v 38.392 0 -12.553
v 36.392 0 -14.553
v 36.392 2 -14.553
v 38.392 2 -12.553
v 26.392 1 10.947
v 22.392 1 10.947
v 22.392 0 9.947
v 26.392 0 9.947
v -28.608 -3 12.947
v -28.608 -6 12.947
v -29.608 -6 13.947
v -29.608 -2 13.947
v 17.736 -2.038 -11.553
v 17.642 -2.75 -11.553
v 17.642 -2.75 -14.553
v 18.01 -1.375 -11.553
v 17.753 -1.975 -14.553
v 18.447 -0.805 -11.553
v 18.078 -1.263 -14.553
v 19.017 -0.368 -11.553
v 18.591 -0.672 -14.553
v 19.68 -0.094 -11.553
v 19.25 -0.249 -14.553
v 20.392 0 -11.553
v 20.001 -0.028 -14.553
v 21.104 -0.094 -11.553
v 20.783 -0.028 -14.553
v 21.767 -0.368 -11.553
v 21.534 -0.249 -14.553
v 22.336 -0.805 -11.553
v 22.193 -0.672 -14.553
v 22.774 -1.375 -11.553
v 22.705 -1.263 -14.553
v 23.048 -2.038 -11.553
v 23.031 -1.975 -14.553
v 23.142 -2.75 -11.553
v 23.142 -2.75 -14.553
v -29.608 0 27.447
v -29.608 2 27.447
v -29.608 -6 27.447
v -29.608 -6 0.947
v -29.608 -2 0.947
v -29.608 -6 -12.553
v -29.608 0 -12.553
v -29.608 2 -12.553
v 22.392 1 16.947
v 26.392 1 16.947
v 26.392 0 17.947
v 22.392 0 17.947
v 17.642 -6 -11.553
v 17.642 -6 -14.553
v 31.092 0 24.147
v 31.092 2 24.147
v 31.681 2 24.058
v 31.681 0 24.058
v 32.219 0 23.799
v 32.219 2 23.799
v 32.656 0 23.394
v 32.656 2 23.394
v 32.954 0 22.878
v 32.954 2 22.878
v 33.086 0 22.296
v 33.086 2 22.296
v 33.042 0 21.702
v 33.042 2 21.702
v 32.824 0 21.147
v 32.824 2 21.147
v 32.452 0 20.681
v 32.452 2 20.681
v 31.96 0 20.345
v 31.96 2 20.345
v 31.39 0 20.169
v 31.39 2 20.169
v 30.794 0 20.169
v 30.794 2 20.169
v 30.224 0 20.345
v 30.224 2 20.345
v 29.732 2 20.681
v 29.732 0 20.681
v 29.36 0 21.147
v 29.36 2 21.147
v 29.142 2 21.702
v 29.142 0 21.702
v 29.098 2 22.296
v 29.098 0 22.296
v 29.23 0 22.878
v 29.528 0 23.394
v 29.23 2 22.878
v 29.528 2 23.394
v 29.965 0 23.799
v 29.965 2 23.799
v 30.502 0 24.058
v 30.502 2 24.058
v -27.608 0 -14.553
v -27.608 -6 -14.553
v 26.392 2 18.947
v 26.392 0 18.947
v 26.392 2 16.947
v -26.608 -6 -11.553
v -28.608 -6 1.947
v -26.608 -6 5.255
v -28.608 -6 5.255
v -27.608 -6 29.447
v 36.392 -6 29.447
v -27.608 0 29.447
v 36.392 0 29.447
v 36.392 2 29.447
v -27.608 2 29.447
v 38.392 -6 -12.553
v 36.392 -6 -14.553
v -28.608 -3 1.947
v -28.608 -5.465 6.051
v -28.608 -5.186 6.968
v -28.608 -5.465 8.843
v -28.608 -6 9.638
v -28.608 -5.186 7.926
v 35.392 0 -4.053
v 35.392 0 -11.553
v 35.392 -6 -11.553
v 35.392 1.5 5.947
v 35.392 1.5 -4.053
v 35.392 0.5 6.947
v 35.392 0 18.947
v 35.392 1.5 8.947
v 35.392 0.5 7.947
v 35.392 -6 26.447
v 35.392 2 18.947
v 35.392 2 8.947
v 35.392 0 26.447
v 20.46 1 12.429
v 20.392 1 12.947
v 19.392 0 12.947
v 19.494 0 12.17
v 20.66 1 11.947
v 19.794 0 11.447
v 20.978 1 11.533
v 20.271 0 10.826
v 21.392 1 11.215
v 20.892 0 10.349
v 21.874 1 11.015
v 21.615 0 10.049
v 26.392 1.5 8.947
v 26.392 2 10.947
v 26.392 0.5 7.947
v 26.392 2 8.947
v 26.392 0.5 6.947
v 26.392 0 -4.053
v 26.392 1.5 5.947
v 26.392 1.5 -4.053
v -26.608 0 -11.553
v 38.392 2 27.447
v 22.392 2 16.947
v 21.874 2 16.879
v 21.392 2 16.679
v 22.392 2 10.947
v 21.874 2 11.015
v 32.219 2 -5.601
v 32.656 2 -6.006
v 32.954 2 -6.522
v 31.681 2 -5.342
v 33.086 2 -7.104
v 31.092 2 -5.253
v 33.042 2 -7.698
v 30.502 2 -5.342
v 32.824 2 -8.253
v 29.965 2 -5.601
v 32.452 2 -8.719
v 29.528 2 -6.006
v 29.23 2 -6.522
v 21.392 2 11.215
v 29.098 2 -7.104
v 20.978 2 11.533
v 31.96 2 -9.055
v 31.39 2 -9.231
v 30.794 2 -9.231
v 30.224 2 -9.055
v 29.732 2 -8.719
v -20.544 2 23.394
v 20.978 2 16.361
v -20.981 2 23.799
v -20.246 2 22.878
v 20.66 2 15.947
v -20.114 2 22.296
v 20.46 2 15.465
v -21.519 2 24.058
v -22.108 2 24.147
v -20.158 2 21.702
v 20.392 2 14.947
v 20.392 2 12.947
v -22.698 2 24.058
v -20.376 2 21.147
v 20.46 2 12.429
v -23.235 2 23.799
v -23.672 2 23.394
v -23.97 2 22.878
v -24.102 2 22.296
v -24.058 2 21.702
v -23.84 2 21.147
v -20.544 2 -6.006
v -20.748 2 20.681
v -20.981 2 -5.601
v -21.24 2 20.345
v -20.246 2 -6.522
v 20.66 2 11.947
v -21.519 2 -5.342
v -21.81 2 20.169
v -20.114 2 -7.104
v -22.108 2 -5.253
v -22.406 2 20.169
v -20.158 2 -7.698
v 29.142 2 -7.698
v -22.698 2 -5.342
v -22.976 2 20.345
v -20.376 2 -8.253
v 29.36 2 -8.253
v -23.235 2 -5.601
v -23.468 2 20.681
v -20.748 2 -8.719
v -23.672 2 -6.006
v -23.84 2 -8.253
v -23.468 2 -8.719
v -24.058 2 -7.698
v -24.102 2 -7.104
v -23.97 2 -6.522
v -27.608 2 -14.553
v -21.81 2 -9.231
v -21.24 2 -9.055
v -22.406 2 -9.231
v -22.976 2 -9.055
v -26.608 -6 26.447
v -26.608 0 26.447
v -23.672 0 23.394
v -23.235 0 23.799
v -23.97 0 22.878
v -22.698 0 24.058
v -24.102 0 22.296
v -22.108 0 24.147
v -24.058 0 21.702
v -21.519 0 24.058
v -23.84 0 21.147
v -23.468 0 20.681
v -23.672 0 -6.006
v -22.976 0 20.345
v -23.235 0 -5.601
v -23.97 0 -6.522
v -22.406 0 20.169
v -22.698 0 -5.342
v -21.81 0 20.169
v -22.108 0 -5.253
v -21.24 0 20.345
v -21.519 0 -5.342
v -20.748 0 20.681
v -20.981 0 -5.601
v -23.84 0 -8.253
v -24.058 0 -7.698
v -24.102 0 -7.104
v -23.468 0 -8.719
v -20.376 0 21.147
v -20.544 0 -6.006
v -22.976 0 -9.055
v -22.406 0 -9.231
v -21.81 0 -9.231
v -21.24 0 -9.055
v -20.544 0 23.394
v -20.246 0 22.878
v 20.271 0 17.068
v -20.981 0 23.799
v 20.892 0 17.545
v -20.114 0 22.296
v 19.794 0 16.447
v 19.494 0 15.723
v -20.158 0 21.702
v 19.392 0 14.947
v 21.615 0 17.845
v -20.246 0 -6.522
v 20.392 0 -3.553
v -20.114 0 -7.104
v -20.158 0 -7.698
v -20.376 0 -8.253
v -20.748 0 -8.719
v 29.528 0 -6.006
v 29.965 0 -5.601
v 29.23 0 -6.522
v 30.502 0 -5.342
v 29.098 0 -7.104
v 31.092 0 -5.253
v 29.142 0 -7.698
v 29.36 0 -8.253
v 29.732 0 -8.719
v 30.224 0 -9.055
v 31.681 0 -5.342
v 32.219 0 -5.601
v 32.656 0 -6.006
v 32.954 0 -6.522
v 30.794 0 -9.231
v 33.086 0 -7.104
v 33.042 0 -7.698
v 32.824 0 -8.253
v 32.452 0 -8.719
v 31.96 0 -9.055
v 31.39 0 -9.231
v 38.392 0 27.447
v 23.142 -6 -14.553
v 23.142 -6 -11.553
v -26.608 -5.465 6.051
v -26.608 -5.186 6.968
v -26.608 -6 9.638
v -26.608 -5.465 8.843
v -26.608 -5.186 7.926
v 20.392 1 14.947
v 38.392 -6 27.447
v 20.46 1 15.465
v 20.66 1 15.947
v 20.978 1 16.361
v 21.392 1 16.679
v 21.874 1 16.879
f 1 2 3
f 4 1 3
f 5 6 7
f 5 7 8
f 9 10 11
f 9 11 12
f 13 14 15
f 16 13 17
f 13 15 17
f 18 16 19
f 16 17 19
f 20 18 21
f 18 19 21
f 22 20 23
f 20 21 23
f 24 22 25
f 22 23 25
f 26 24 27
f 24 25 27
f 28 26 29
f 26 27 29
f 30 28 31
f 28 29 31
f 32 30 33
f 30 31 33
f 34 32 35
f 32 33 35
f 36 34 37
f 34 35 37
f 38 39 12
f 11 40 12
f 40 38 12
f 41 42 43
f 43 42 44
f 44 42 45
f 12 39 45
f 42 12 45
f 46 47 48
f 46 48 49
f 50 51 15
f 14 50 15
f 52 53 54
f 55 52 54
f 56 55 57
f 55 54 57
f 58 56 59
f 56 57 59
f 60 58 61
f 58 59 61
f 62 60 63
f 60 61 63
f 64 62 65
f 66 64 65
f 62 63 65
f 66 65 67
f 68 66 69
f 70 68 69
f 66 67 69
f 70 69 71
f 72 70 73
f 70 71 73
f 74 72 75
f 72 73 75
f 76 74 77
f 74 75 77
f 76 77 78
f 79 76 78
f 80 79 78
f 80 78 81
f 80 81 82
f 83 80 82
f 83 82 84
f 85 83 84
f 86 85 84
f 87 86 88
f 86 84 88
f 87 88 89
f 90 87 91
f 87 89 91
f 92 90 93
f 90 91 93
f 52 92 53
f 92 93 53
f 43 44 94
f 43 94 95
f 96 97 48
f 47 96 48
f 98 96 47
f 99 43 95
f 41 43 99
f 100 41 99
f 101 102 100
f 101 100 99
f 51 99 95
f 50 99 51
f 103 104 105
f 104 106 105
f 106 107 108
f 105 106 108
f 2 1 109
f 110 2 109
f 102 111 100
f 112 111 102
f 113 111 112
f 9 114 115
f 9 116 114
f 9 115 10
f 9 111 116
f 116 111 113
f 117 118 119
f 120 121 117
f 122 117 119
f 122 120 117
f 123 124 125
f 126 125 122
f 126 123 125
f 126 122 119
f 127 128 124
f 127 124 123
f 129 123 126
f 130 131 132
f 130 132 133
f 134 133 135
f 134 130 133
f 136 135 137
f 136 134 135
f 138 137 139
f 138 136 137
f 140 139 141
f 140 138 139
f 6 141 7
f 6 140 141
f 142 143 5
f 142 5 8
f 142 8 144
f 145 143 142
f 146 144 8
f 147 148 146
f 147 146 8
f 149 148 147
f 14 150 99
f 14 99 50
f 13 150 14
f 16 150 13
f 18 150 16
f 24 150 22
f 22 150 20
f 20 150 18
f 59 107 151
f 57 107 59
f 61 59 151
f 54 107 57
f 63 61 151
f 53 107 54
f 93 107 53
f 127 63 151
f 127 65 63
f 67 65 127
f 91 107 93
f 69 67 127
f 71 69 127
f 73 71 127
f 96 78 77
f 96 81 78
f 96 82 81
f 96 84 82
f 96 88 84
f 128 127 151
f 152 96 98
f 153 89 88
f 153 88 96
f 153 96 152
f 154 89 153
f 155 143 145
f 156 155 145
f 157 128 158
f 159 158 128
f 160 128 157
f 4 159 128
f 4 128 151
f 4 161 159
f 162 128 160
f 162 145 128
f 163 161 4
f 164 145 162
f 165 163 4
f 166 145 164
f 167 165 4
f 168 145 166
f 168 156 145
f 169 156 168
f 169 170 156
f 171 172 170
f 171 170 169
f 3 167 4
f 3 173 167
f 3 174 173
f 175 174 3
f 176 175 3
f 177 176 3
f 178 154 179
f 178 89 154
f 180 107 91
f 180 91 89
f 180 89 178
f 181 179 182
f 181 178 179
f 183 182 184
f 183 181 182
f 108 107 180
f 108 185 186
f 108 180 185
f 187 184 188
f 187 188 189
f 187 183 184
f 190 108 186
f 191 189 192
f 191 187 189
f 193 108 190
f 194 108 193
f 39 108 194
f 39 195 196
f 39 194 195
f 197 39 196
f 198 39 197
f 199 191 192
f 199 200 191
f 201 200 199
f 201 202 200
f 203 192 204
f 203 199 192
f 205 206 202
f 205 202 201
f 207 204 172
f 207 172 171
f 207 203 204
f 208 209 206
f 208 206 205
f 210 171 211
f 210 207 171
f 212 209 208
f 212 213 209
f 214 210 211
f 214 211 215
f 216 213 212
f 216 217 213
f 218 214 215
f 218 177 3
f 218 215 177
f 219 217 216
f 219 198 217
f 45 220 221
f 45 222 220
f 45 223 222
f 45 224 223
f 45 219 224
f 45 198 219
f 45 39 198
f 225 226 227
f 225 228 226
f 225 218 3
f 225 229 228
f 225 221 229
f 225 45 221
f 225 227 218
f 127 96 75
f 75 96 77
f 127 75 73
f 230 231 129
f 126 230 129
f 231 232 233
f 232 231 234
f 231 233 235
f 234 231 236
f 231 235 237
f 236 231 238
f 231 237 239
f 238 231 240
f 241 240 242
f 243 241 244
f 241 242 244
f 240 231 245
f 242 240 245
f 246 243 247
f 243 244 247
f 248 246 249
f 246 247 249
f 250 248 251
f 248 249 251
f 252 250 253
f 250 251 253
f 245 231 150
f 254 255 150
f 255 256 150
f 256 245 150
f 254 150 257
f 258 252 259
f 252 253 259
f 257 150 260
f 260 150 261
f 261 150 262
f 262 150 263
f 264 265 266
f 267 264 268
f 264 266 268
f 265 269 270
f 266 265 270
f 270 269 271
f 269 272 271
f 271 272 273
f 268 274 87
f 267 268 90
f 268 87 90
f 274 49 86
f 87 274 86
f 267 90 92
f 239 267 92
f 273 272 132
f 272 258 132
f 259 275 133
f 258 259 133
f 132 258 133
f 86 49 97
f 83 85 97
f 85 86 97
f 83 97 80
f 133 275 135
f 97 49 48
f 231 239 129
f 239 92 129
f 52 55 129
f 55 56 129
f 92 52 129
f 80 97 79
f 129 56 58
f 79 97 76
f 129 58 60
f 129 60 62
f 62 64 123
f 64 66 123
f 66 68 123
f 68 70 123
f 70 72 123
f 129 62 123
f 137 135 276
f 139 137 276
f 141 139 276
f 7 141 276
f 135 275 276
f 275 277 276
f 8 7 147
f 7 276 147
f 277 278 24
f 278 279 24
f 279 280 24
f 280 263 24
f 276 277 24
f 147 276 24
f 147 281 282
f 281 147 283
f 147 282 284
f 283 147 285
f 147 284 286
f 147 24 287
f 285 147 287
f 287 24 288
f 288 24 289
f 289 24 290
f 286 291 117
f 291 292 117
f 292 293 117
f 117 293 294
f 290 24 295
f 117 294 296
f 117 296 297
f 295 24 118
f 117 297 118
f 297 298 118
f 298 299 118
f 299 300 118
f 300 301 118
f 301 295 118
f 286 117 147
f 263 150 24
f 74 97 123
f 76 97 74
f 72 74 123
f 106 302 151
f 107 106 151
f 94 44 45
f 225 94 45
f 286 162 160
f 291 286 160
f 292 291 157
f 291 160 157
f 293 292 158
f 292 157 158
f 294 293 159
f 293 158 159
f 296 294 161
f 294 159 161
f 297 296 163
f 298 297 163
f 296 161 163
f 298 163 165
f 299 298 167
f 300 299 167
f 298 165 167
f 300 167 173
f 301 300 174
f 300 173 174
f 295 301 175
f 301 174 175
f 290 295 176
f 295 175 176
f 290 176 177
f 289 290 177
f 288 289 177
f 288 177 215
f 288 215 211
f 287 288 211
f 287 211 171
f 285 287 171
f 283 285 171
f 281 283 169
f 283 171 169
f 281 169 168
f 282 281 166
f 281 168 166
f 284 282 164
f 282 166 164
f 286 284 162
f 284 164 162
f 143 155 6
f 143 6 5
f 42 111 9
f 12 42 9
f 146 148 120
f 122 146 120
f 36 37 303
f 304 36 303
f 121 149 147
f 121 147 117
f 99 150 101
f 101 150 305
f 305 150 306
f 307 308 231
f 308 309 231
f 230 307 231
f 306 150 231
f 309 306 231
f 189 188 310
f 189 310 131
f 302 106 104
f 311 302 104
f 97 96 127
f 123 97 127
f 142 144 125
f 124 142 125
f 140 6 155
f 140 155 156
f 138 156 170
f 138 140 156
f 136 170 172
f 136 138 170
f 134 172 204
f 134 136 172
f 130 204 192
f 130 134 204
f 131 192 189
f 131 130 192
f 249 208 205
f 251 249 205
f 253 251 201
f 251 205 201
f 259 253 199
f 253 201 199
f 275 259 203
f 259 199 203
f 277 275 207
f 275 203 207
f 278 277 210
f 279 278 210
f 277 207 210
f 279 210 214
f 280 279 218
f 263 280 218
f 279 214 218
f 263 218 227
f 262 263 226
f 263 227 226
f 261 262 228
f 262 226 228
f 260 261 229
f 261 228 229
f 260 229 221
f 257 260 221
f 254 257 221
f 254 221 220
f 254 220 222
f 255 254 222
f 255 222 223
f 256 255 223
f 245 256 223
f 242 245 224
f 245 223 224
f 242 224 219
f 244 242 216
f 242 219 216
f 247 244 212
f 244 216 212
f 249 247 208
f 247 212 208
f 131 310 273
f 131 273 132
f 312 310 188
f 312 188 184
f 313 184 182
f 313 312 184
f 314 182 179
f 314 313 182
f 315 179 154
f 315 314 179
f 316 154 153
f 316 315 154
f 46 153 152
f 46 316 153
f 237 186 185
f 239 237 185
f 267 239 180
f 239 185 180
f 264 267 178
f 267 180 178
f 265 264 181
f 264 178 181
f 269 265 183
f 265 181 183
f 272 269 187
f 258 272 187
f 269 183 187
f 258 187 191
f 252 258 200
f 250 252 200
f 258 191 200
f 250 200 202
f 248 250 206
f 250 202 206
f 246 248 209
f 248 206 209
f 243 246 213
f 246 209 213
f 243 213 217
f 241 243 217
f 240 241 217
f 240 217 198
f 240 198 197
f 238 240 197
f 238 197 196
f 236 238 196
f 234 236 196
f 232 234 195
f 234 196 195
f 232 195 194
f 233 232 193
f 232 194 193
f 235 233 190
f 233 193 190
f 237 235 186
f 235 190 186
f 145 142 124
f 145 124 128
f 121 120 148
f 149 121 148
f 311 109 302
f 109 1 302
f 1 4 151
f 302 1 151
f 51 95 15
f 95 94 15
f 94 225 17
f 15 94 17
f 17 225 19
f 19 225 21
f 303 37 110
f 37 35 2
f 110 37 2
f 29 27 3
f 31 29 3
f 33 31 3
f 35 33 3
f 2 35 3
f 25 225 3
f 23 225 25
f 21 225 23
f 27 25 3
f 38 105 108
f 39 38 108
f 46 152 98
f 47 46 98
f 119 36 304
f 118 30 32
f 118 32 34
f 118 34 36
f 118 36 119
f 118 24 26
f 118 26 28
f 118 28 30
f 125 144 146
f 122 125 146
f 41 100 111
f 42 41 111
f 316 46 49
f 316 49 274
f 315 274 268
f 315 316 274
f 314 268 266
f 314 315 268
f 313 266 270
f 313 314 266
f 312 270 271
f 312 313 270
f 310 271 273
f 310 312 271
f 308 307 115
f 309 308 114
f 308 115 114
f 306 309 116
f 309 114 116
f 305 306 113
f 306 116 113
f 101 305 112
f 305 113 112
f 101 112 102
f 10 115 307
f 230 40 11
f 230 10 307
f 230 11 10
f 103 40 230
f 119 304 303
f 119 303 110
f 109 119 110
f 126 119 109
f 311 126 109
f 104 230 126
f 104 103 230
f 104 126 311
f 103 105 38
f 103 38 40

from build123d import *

# Parameters (mm, degrees)
SKETCH1_W            = 68
SKETCH1_H            = 44
BOSS_EXTRUDE1_DEPTH  = 2
SKETCH2_R            = 2
CUT_EXTRUDE1_DEPTH   = 2
SKETCH3_W            = 12
SKETCH3_H            = 23
CUT_EXTRUDE2_DEPTH   = 2
SKETCH4_W            = 3
SKETCH4_H            = 23
BOSS_EXTRUDE2_DEPTH  = 2
SKETCH8_W            = 6
SKETCH8_H            = 12
CUT_EXTRUDE4_DEPTH   = 20
CHAMFER2_SIZE        = 1
CHAMFER4_SIZE        = 2
SKETCH9_W            = 62
SKETCH9_H            = 38
BOSS_EXTRUDE5_DEPTH  = 6
CHAMFER5_SIZE        = 2
SKETCH12_W           = 8.376373975
SKETCH12_H           = 18.223954528
BOSS_EXTRUDE10_DEPTH = 2
SKETCH15_W           = 3
SKETCH15_H           = 1.5
BOSS_EXTRUDE11_DEPTH = 12
CHAMFER7_SIZE        = 1
SKETCH16_W           = 9
SKETCH16_H           = 0.5
BOSS_EXTRUDE12_DEPTH = 11
SKETCH17_W           = 6
SKETCH17_H           = 6
CUT_EXTRUDE5_DEPTH   = 11
FILLET1_R            = 2
SKETCH18_W           = 11
SKETCH18_H           = 3
CUT_EXTRUDE6_DEPTH   = 1
CHAMFER8_SIZE        = 1
SKETCH19_R           = 3.25
CUT_EXTRUDE7_DEPTH   = 11
CUT_EXTRUDE8_DEPTH   = 11
CHAMFER9_SIZE        = 1


with BuildPart() as part:
    # Sketch1 → Boss-Extrude1 (new body)
    with BuildSketch(Plane(origin=(0, 0, 0), x_dir=(1, 0, 0), z_dir=(0, 1, 0))):
        with Locations((4.391941392, -7.446886447)):
            Rectangle(SKETCH1_W, SKETCH1_H)
    extrude(amount=BOSS_EXTRUDE1_DEPTH)

    # Sketch2 → Cut-Extrude1 (cut)
    with BuildSketch(Plane(origin=(0, 2, 0), x_dir=(1, 0, 0), z_dir=(0, 1, 0))):
        with Locations(Location((-22.108058608, 7.253113553, 0), (0, 0, 270))):
            Circle(SKETCH2_R)
        with Locations(Location((31.091941392, 7.253113553, 0), (0, 0, 270))):
            Circle(SKETCH2_R)
        with Locations(Location((31.091941392, -22.146886447, 0), (0, 0, 270))):
            Circle(SKETCH2_R)
        with Locations(Location((-22.108058608, -22.146886447, 0), (0, 0, 270))):
            Circle(SKETCH2_R)
    extrude(amount=-CUT_EXTRUDE1_DEPTH, mode=Mode.SUBTRACT)

    # Sketch3 → Cut-Extrude2 (cut)
    with BuildSketch(Plane(origin=(0, 2, 0), x_dir=(1, 0, 0), z_dir=(0, 1, 0))):
        with Locations((32.391941392, -7.446886447)):
            Rectangle(SKETCH3_W, SKETCH3_H)
    extrude(amount=-CUT_EXTRUDE2_DEPTH, mode=Mode.SUBTRACT)

    # Sketch4 → Boss-Extrude2 (add)
    with BuildSketch(Plane(origin=(0, 2, 0), x_dir=(1, 0, 0), z_dir=(0, 1, 0))):
        with Locations((36.891941392, -7.446886447)):
            Rectangle(SKETCH4_W, SKETCH4_H)
    extrude(amount=-BOSS_EXTRUDE2_DEPTH)

    # Sketch8 → Cut-Extrude4 (cut)
    with BuildSketch(Plane(origin=(0, 2, 0), x_dir=(1, 0, 0), z_dir=(0, 1, 0))):
        with Locations((-26.608058608, -7.446886447)):
            Rectangle(SKETCH8_W, SKETCH8_H)
    extrude(amount=-CUT_EXTRUDE4_DEPTH, mode=Mode.SUBTRACT)

    # Chamfer2
    chamfer2_edges = [part.edges().sort_by_distance(p)[0] for p in [
        (-29.608058608, 1, 13.446886447),
        (-29.608058608, 1, 1.446886447),
    ]]
    chamfer(chamfer2_edges, length=CHAMFER2_SIZE)

    # Chamfer4
    chamfer4_edges = [part.edges().sort_by_distance(p)[0] for p in [
        (-29.608058608, 1, -14.553113553),
        (38.391941392, 1, -14.553113553),
        (38.391941392, 1, 29.446886447),
        (-29.608058608, 1, 29.446886447),
    ]]
    chamfer(chamfer4_edges, length=CHAMFER4_SIZE)

    # Sketch9 → Boss-Extrude5 (add)
    with BuildSketch(Plane.XZ):
        Polygon((-29.608058608, -14.553113553), (38.391941392, -14.553113553), (38.391941392, -11.553113553), (38.391941392, 25.764285426), (38.391941392, 29.446886447), (-29.608058608, 29.446886447), (-29.608058608, 25.764285426), (-29.608058608, -11.553113553), align=None)
        with Locations((4.391941392, 7.446886447)):
            Rectangle(SKETCH9_W, SKETCH9_H, mode=Mode.SUBTRACT)
    extrude(amount=BOSS_EXTRUDE5_DEPTH)

    # Chamfer5
    chamfer5_edges = [part.edges().sort_by_distance(p)[0] for p in [
        (38.391941392, -3, 29.446886447),
        (-29.608058608, -3, 29.446886447),
        (-29.608058608, -3, -14.553113553),
        (38.391941392, -3, -14.553113553),
    ]]
    chamfer(chamfer5_edges, length=CHAMFER5_SIZE - 0.0001)  # a hair under: the kernel refuses the full size

    # Sketch12 → Boss-Extrude10 (add)
    with BuildSketch(Plane(origin=(0, 2, 0), x_dir=(1, 0, 0), z_dir=(0, 1, 0))):
        with Locations((-25.419871621, -7.493021435)):
            Rectangle(SKETCH12_W, SKETCH12_H)
    extrude(amount=-BOSS_EXTRUDE10_DEPTH)

    # Sketch15 → Boss-Extrude11 (add)
    with BuildSketch(Plane(origin=(26.391941392, 0, 0), x_dir=(0, 0, -1), z_dir=(1, 0, 0))):
        with Locations((-7.446886447, 1.25)):
            Rectangle(SKETCH15_W, SKETCH15_H)
    extrude(amount=BOSS_EXTRUDE11_DEPTH)

    # Chamfer7
    chamfer7_edges = [part.edges().sort_by_distance(p)[0] for p in [
        (30.891941392, 0.5, 8.946886447),
        (30.891941392, 0.5, 5.946886447),
    ]]
    chamfer(chamfer7_edges, length=CHAMFER7_SIZE)

    # Sketch16 → Boss-Extrude12 (add)
    with BuildSketch(Plane(origin=(0, 0, 5.946886447), x_dir=(-1, 0, 0), z_dir=(0, 0, -1))):
        with Locations((-30.891941392, 1.75)):
            Rectangle(SKETCH16_W, SKETCH16_H)
    extrude(amount=BOSS_EXTRUDE12_DEPTH)

    # Sketch17 → Cut-Extrude5 (cut)
    with BuildSketch(Plane(origin=(0, 2, 0), x_dir=(1, 0, 0), z_dir=(0, 1, 0))):
        with Locations((23.391941392, -13.946886447)):
            Rectangle(SKETCH17_W, SKETCH17_H)
    extrude(amount=-CUT_EXTRUDE5_DEPTH, mode=Mode.SUBTRACT)

    # Fillet1
    fillet1_edges = [part.edges().sort_by_distance(p)[0] for p in [
        (20.391941392, 1, 16.946886447),
        (20.391941392, 1, 10.946886447),
    ]]
    fillet(fillet1_edges, radius=FILLET1_R)

    # Sketch18 → Cut-Extrude6 (cut)
    with BuildSketch(Plane.ZY.offset(29.608058608)):
        with Locations((7.446886447, -4.5)):
            Rectangle(SKETCH18_W, SKETCH18_H)
    extrude(amount=-CUT_EXTRUDE6_DEPTH, mode=Mode.SUBTRACT)

    # Chamfer8
    chamfer8_edges = [part.edges().sort_by_distance(p)[0] for p in [
        (-29.608058608, -4.5, 12.946886447),
        (-29.608058608, -3, 7.446886447),
        (-29.608058608, -4.5, 1.946886447),
    ]]
    chamfer(chamfer8_edges, length=CHAMFER8_SIZE - 0.0001)  # a hair under: the kernel refuses the full size

    # Sketch19 → Cut-Extrude7 (cut)
    with BuildSketch(Plane.ZY.offset(28.608058608)):
        with Locations((7.446886447, -8.4)):
            Circle(SKETCH19_R)
    extrude(amount=-CUT_EXTRUDE7_DEPTH, mode=Mode.SUBTRACT)

    # Sketch20 → Cut-Extrude8 (cut)
    with BuildSketch(Plane(origin=(0, 0, -14.553113553), x_dir=(-1, 0, 0), z_dir=(0, 0, -1))):
        with BuildLine():
            Line((-23.141941392, -2.75), (-23.141941392, -6))
            Line((-23.141941392, -6), (-17.641941392, -6))
            Line((-17.641941392, -6), (-17.641941392, -2.75))
            ThreePointArc((-17.641941392, -2.75), (-20.391941392, 0), (-23.141941392, -2.75))
        make_face()
    extrude(amount=-CUT_EXTRUDE8_DEPTH, mode=Mode.SUBTRACT)

    # Chamfer9
    chamfer9_edges = [part.edges().sort_by_distance(p)[0] for p in [
        (24.391941392, 0, 10.946886447),
        (20.391941392, 0, 13.946886447),
        (24.391941392, 0, 16.946886447),
        (20.97772783, 0, 11.532672885),
        (20.97772783, 0, 16.361100009),
    ]]
    chamfer(chamfer9_edges, length=CHAMFER9_SIZE)


solid = part.part
